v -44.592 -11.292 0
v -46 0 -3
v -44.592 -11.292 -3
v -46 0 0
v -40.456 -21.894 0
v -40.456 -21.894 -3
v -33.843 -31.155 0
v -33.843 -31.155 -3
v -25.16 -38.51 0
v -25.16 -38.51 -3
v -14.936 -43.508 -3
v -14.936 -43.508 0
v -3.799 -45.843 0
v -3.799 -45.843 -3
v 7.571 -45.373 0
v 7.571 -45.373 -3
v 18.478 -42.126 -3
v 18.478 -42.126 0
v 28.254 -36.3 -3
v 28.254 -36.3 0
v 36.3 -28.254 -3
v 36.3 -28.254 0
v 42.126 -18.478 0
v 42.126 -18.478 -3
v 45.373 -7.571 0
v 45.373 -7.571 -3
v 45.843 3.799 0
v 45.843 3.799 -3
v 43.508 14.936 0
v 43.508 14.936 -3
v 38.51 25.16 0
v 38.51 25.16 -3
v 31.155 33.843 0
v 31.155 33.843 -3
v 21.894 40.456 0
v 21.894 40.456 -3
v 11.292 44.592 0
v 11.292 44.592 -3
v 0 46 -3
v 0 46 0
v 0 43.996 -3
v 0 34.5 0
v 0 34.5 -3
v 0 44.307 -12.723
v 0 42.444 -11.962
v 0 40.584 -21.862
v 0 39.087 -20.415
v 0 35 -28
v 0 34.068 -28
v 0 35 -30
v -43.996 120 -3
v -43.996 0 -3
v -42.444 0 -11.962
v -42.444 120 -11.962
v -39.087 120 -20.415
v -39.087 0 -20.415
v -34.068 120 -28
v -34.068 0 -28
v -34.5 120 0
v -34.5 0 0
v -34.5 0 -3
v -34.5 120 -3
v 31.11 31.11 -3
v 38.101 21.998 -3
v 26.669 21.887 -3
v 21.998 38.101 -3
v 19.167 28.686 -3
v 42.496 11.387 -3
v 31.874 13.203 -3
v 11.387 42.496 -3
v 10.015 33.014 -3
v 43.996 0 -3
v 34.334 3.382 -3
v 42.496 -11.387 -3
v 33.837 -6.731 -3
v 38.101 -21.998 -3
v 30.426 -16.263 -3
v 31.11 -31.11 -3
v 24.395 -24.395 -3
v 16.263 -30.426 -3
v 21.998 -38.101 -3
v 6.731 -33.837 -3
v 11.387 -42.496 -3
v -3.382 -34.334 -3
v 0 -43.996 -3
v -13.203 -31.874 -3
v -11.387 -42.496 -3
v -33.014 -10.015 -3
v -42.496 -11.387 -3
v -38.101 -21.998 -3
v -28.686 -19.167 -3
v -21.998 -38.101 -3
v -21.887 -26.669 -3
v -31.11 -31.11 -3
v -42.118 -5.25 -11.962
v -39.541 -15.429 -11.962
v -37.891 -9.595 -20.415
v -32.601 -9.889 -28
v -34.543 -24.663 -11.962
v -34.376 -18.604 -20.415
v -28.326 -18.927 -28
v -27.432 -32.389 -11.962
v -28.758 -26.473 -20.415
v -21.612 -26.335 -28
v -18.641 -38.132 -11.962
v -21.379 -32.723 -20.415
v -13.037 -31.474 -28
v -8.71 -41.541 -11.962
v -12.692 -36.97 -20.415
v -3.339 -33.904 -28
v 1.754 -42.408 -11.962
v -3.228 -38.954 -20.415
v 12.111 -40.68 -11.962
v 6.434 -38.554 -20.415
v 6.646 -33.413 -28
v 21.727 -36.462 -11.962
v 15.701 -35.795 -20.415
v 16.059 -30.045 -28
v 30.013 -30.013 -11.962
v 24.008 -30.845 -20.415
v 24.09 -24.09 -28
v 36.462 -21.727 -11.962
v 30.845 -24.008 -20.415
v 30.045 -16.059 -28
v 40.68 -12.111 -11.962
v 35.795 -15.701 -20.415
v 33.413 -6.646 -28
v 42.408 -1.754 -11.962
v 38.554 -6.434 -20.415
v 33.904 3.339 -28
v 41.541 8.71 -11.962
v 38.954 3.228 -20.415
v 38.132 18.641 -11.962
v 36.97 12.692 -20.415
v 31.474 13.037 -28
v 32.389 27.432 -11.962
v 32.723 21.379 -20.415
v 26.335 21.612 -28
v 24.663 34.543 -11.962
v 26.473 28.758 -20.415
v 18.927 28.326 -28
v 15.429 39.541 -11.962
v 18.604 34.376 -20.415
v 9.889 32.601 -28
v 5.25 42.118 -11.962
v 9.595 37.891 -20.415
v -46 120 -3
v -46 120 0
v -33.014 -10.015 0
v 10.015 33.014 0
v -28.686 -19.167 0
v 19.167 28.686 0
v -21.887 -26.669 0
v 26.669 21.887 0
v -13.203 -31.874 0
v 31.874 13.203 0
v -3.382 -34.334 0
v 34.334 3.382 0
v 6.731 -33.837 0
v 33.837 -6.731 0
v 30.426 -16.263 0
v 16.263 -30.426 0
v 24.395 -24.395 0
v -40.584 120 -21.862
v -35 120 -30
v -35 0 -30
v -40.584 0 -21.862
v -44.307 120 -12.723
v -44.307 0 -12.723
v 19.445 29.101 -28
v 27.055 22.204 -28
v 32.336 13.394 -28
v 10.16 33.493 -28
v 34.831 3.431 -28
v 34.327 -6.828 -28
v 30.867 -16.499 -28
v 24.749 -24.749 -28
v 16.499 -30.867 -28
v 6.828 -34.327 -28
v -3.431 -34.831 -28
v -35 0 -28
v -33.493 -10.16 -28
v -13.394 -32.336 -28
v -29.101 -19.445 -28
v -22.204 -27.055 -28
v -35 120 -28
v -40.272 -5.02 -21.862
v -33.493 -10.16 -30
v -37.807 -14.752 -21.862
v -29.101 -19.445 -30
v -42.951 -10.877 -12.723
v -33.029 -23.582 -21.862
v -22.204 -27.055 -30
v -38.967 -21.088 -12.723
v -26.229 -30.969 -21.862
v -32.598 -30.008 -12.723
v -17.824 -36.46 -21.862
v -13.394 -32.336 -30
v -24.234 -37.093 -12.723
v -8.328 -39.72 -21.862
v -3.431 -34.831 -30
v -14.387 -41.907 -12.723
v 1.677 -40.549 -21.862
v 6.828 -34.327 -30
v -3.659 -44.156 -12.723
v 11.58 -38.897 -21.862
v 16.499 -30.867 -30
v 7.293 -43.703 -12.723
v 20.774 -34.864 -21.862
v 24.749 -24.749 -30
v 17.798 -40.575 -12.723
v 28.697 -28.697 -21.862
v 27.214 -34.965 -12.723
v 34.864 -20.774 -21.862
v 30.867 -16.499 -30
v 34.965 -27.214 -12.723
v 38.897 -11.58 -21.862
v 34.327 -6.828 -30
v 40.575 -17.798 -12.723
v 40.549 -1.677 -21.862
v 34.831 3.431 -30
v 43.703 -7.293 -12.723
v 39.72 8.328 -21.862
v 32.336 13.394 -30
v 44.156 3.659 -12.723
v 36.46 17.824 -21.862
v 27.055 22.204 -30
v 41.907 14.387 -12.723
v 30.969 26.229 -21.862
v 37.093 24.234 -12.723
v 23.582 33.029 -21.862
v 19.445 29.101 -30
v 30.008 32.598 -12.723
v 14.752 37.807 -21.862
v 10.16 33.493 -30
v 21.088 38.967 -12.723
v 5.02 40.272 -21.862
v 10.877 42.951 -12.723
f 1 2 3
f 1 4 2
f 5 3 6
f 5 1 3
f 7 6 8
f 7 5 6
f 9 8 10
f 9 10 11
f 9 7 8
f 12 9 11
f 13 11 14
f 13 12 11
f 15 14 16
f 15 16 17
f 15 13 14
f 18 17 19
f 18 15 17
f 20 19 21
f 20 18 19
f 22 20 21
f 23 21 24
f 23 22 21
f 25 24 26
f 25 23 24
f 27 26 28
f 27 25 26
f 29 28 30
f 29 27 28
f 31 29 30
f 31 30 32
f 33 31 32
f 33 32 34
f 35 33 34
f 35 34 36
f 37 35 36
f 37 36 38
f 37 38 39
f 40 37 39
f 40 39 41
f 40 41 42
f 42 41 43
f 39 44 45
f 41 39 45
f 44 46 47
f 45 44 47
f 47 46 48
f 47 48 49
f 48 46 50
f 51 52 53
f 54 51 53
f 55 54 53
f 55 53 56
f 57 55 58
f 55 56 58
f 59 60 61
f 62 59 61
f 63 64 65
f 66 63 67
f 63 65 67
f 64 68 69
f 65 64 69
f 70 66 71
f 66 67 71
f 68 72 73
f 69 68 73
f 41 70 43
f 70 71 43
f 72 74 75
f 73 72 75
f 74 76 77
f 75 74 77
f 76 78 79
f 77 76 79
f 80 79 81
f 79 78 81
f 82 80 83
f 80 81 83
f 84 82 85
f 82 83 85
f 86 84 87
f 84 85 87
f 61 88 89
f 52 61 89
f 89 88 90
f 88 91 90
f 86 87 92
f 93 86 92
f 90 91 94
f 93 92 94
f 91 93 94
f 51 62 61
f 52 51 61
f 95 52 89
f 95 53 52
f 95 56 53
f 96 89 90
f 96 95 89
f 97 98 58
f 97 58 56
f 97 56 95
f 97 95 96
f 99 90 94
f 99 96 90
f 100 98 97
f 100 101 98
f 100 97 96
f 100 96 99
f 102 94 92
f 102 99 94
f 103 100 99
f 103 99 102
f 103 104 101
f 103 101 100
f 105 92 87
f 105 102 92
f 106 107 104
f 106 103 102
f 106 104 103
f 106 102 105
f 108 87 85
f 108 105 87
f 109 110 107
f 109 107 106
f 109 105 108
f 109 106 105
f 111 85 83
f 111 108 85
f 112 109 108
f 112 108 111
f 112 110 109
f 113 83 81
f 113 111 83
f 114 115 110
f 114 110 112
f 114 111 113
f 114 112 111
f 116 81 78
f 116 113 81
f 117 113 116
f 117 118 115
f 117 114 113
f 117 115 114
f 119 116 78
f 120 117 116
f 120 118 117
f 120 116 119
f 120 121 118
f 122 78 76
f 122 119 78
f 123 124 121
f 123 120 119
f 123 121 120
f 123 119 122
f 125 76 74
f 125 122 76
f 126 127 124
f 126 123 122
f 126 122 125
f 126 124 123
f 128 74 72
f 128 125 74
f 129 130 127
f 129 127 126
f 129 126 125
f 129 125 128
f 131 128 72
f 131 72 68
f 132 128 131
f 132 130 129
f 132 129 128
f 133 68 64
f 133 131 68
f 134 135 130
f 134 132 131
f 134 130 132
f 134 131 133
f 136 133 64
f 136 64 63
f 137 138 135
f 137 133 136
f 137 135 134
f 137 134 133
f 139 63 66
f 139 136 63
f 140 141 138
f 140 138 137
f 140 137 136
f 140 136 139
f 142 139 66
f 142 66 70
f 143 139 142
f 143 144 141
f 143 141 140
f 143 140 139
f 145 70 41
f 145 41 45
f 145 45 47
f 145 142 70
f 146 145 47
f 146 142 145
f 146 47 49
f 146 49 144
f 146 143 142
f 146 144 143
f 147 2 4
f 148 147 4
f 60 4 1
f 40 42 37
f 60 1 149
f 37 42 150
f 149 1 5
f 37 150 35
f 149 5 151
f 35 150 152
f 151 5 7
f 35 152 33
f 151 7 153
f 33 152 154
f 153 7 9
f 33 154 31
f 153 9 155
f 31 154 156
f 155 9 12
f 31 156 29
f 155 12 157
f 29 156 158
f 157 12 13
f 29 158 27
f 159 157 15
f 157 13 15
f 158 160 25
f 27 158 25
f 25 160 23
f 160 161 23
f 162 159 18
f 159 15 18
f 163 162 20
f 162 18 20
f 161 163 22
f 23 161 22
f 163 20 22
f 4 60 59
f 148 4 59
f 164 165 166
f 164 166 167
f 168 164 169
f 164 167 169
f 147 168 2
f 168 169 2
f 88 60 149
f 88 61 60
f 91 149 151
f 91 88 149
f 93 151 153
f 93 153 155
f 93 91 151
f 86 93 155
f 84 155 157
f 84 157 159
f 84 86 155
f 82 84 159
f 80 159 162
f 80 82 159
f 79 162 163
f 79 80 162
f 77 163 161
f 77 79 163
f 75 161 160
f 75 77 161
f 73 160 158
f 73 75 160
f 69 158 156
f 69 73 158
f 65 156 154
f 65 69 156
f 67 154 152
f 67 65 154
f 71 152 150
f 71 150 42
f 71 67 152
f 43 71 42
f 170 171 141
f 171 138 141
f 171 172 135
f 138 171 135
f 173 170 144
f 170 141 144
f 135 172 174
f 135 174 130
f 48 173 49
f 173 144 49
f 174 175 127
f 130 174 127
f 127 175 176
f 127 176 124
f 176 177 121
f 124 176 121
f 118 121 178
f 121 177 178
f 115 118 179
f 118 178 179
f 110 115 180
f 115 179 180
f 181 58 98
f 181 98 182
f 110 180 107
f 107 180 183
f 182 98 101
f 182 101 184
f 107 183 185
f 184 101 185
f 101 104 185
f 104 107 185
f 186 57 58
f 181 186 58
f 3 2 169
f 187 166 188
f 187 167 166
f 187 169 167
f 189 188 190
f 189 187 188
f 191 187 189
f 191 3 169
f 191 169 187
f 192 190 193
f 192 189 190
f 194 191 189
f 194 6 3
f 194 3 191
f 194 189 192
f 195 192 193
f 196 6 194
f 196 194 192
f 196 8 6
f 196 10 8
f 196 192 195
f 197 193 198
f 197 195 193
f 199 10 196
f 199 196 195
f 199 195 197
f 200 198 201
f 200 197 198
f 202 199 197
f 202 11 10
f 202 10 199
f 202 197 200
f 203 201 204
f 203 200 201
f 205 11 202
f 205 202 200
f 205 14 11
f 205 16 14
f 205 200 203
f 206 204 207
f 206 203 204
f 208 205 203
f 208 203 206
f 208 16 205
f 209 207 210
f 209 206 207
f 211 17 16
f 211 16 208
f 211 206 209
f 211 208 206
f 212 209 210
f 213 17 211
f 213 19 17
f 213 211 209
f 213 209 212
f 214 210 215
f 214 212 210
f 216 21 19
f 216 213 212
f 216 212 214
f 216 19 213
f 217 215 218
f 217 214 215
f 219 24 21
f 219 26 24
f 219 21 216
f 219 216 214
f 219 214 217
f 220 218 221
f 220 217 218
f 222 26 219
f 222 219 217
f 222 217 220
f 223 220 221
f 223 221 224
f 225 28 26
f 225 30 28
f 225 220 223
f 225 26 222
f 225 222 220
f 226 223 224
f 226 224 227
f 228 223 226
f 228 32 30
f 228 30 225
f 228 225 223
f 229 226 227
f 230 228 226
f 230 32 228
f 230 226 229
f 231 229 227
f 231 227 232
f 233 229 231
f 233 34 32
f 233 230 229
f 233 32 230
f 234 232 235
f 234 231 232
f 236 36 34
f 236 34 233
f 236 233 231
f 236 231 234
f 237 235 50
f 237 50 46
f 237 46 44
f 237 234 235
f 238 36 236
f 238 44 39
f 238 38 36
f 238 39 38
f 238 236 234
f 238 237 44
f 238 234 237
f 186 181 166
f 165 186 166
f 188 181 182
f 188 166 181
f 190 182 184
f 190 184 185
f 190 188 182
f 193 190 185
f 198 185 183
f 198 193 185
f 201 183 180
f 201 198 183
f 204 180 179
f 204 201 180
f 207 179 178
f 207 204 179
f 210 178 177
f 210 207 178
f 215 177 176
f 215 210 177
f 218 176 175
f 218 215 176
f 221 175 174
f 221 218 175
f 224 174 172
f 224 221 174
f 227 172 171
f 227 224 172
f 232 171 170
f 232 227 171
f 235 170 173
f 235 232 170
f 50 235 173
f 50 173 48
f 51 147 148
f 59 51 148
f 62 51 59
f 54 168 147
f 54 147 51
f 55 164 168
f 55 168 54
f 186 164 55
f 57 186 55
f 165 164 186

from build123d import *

# Parameters (mm, degrees)
REVOLVE_2_ANGLE = 270
EXTRUDE_1_DEPTH = 120


with BuildPart() as part:
    # 草图2 → 旋转2 (revolve)
    with BuildSketch(Plane(origin=(0, 0, 0), x_dir=(1, 0, 0), z_dir=(0, 1, 0))):
        with BuildLine():
            Line((-34.5, 0), (-34.5, 3))
            Line((-34.5, 3), (-43, 3))
            Line((-43, 3), (-43.995557857, 3))
            ThreePointArc((-43.995557857, 3), (-40.98437005, 16.275457684), (-34.067713618, 28))
            Line((-34.067713618, 28), (-35, 28))
            Line((-35, 28), (-35, 30))
            ThreePointArc((-35, 30), (-42.690748412, 17.392527131), (-46, 3))
            Line((-46, 3), (-46, 0))
            Line((-46, 0), (-34.5, 0))
        make_face()
    revolve(axis=Axis((0, 0, -42), (0, 0, 1)), revolution_arc=REVOLVE_2_ANGLE)

    # 草图2<2> → 凸台-拉伸1 (add)
    with BuildSketch(Plane(origin=(0, 0, 0), x_dir=(1, 0, 0), z_dir=(0, 1, 0))):
        with BuildLine():
            Line((-34.5, 0), (-34.5, 3))
            Line((-34.5, 3), (-43, 3))
            Line((-43, 3), (-43.995557857, 3))
            ThreePointArc((-43.995557857, 3), (-40.98437005, 16.275457684), (-34.067713618, 28))
            Line((-34.067713618, 28), (-35, 28))
            Line((-35, 28), (-35, 30))
            ThreePointArc((-35, 30), (-42.690748412, 17.392527131), (-46, 3))
            Line((-46, 3), (-46, 0))
            Line((-46, 0), (-34.5, 0))
        make_face()
    extrude(amount=EXTRUDE_1_DEPTH)


solid = part.part
